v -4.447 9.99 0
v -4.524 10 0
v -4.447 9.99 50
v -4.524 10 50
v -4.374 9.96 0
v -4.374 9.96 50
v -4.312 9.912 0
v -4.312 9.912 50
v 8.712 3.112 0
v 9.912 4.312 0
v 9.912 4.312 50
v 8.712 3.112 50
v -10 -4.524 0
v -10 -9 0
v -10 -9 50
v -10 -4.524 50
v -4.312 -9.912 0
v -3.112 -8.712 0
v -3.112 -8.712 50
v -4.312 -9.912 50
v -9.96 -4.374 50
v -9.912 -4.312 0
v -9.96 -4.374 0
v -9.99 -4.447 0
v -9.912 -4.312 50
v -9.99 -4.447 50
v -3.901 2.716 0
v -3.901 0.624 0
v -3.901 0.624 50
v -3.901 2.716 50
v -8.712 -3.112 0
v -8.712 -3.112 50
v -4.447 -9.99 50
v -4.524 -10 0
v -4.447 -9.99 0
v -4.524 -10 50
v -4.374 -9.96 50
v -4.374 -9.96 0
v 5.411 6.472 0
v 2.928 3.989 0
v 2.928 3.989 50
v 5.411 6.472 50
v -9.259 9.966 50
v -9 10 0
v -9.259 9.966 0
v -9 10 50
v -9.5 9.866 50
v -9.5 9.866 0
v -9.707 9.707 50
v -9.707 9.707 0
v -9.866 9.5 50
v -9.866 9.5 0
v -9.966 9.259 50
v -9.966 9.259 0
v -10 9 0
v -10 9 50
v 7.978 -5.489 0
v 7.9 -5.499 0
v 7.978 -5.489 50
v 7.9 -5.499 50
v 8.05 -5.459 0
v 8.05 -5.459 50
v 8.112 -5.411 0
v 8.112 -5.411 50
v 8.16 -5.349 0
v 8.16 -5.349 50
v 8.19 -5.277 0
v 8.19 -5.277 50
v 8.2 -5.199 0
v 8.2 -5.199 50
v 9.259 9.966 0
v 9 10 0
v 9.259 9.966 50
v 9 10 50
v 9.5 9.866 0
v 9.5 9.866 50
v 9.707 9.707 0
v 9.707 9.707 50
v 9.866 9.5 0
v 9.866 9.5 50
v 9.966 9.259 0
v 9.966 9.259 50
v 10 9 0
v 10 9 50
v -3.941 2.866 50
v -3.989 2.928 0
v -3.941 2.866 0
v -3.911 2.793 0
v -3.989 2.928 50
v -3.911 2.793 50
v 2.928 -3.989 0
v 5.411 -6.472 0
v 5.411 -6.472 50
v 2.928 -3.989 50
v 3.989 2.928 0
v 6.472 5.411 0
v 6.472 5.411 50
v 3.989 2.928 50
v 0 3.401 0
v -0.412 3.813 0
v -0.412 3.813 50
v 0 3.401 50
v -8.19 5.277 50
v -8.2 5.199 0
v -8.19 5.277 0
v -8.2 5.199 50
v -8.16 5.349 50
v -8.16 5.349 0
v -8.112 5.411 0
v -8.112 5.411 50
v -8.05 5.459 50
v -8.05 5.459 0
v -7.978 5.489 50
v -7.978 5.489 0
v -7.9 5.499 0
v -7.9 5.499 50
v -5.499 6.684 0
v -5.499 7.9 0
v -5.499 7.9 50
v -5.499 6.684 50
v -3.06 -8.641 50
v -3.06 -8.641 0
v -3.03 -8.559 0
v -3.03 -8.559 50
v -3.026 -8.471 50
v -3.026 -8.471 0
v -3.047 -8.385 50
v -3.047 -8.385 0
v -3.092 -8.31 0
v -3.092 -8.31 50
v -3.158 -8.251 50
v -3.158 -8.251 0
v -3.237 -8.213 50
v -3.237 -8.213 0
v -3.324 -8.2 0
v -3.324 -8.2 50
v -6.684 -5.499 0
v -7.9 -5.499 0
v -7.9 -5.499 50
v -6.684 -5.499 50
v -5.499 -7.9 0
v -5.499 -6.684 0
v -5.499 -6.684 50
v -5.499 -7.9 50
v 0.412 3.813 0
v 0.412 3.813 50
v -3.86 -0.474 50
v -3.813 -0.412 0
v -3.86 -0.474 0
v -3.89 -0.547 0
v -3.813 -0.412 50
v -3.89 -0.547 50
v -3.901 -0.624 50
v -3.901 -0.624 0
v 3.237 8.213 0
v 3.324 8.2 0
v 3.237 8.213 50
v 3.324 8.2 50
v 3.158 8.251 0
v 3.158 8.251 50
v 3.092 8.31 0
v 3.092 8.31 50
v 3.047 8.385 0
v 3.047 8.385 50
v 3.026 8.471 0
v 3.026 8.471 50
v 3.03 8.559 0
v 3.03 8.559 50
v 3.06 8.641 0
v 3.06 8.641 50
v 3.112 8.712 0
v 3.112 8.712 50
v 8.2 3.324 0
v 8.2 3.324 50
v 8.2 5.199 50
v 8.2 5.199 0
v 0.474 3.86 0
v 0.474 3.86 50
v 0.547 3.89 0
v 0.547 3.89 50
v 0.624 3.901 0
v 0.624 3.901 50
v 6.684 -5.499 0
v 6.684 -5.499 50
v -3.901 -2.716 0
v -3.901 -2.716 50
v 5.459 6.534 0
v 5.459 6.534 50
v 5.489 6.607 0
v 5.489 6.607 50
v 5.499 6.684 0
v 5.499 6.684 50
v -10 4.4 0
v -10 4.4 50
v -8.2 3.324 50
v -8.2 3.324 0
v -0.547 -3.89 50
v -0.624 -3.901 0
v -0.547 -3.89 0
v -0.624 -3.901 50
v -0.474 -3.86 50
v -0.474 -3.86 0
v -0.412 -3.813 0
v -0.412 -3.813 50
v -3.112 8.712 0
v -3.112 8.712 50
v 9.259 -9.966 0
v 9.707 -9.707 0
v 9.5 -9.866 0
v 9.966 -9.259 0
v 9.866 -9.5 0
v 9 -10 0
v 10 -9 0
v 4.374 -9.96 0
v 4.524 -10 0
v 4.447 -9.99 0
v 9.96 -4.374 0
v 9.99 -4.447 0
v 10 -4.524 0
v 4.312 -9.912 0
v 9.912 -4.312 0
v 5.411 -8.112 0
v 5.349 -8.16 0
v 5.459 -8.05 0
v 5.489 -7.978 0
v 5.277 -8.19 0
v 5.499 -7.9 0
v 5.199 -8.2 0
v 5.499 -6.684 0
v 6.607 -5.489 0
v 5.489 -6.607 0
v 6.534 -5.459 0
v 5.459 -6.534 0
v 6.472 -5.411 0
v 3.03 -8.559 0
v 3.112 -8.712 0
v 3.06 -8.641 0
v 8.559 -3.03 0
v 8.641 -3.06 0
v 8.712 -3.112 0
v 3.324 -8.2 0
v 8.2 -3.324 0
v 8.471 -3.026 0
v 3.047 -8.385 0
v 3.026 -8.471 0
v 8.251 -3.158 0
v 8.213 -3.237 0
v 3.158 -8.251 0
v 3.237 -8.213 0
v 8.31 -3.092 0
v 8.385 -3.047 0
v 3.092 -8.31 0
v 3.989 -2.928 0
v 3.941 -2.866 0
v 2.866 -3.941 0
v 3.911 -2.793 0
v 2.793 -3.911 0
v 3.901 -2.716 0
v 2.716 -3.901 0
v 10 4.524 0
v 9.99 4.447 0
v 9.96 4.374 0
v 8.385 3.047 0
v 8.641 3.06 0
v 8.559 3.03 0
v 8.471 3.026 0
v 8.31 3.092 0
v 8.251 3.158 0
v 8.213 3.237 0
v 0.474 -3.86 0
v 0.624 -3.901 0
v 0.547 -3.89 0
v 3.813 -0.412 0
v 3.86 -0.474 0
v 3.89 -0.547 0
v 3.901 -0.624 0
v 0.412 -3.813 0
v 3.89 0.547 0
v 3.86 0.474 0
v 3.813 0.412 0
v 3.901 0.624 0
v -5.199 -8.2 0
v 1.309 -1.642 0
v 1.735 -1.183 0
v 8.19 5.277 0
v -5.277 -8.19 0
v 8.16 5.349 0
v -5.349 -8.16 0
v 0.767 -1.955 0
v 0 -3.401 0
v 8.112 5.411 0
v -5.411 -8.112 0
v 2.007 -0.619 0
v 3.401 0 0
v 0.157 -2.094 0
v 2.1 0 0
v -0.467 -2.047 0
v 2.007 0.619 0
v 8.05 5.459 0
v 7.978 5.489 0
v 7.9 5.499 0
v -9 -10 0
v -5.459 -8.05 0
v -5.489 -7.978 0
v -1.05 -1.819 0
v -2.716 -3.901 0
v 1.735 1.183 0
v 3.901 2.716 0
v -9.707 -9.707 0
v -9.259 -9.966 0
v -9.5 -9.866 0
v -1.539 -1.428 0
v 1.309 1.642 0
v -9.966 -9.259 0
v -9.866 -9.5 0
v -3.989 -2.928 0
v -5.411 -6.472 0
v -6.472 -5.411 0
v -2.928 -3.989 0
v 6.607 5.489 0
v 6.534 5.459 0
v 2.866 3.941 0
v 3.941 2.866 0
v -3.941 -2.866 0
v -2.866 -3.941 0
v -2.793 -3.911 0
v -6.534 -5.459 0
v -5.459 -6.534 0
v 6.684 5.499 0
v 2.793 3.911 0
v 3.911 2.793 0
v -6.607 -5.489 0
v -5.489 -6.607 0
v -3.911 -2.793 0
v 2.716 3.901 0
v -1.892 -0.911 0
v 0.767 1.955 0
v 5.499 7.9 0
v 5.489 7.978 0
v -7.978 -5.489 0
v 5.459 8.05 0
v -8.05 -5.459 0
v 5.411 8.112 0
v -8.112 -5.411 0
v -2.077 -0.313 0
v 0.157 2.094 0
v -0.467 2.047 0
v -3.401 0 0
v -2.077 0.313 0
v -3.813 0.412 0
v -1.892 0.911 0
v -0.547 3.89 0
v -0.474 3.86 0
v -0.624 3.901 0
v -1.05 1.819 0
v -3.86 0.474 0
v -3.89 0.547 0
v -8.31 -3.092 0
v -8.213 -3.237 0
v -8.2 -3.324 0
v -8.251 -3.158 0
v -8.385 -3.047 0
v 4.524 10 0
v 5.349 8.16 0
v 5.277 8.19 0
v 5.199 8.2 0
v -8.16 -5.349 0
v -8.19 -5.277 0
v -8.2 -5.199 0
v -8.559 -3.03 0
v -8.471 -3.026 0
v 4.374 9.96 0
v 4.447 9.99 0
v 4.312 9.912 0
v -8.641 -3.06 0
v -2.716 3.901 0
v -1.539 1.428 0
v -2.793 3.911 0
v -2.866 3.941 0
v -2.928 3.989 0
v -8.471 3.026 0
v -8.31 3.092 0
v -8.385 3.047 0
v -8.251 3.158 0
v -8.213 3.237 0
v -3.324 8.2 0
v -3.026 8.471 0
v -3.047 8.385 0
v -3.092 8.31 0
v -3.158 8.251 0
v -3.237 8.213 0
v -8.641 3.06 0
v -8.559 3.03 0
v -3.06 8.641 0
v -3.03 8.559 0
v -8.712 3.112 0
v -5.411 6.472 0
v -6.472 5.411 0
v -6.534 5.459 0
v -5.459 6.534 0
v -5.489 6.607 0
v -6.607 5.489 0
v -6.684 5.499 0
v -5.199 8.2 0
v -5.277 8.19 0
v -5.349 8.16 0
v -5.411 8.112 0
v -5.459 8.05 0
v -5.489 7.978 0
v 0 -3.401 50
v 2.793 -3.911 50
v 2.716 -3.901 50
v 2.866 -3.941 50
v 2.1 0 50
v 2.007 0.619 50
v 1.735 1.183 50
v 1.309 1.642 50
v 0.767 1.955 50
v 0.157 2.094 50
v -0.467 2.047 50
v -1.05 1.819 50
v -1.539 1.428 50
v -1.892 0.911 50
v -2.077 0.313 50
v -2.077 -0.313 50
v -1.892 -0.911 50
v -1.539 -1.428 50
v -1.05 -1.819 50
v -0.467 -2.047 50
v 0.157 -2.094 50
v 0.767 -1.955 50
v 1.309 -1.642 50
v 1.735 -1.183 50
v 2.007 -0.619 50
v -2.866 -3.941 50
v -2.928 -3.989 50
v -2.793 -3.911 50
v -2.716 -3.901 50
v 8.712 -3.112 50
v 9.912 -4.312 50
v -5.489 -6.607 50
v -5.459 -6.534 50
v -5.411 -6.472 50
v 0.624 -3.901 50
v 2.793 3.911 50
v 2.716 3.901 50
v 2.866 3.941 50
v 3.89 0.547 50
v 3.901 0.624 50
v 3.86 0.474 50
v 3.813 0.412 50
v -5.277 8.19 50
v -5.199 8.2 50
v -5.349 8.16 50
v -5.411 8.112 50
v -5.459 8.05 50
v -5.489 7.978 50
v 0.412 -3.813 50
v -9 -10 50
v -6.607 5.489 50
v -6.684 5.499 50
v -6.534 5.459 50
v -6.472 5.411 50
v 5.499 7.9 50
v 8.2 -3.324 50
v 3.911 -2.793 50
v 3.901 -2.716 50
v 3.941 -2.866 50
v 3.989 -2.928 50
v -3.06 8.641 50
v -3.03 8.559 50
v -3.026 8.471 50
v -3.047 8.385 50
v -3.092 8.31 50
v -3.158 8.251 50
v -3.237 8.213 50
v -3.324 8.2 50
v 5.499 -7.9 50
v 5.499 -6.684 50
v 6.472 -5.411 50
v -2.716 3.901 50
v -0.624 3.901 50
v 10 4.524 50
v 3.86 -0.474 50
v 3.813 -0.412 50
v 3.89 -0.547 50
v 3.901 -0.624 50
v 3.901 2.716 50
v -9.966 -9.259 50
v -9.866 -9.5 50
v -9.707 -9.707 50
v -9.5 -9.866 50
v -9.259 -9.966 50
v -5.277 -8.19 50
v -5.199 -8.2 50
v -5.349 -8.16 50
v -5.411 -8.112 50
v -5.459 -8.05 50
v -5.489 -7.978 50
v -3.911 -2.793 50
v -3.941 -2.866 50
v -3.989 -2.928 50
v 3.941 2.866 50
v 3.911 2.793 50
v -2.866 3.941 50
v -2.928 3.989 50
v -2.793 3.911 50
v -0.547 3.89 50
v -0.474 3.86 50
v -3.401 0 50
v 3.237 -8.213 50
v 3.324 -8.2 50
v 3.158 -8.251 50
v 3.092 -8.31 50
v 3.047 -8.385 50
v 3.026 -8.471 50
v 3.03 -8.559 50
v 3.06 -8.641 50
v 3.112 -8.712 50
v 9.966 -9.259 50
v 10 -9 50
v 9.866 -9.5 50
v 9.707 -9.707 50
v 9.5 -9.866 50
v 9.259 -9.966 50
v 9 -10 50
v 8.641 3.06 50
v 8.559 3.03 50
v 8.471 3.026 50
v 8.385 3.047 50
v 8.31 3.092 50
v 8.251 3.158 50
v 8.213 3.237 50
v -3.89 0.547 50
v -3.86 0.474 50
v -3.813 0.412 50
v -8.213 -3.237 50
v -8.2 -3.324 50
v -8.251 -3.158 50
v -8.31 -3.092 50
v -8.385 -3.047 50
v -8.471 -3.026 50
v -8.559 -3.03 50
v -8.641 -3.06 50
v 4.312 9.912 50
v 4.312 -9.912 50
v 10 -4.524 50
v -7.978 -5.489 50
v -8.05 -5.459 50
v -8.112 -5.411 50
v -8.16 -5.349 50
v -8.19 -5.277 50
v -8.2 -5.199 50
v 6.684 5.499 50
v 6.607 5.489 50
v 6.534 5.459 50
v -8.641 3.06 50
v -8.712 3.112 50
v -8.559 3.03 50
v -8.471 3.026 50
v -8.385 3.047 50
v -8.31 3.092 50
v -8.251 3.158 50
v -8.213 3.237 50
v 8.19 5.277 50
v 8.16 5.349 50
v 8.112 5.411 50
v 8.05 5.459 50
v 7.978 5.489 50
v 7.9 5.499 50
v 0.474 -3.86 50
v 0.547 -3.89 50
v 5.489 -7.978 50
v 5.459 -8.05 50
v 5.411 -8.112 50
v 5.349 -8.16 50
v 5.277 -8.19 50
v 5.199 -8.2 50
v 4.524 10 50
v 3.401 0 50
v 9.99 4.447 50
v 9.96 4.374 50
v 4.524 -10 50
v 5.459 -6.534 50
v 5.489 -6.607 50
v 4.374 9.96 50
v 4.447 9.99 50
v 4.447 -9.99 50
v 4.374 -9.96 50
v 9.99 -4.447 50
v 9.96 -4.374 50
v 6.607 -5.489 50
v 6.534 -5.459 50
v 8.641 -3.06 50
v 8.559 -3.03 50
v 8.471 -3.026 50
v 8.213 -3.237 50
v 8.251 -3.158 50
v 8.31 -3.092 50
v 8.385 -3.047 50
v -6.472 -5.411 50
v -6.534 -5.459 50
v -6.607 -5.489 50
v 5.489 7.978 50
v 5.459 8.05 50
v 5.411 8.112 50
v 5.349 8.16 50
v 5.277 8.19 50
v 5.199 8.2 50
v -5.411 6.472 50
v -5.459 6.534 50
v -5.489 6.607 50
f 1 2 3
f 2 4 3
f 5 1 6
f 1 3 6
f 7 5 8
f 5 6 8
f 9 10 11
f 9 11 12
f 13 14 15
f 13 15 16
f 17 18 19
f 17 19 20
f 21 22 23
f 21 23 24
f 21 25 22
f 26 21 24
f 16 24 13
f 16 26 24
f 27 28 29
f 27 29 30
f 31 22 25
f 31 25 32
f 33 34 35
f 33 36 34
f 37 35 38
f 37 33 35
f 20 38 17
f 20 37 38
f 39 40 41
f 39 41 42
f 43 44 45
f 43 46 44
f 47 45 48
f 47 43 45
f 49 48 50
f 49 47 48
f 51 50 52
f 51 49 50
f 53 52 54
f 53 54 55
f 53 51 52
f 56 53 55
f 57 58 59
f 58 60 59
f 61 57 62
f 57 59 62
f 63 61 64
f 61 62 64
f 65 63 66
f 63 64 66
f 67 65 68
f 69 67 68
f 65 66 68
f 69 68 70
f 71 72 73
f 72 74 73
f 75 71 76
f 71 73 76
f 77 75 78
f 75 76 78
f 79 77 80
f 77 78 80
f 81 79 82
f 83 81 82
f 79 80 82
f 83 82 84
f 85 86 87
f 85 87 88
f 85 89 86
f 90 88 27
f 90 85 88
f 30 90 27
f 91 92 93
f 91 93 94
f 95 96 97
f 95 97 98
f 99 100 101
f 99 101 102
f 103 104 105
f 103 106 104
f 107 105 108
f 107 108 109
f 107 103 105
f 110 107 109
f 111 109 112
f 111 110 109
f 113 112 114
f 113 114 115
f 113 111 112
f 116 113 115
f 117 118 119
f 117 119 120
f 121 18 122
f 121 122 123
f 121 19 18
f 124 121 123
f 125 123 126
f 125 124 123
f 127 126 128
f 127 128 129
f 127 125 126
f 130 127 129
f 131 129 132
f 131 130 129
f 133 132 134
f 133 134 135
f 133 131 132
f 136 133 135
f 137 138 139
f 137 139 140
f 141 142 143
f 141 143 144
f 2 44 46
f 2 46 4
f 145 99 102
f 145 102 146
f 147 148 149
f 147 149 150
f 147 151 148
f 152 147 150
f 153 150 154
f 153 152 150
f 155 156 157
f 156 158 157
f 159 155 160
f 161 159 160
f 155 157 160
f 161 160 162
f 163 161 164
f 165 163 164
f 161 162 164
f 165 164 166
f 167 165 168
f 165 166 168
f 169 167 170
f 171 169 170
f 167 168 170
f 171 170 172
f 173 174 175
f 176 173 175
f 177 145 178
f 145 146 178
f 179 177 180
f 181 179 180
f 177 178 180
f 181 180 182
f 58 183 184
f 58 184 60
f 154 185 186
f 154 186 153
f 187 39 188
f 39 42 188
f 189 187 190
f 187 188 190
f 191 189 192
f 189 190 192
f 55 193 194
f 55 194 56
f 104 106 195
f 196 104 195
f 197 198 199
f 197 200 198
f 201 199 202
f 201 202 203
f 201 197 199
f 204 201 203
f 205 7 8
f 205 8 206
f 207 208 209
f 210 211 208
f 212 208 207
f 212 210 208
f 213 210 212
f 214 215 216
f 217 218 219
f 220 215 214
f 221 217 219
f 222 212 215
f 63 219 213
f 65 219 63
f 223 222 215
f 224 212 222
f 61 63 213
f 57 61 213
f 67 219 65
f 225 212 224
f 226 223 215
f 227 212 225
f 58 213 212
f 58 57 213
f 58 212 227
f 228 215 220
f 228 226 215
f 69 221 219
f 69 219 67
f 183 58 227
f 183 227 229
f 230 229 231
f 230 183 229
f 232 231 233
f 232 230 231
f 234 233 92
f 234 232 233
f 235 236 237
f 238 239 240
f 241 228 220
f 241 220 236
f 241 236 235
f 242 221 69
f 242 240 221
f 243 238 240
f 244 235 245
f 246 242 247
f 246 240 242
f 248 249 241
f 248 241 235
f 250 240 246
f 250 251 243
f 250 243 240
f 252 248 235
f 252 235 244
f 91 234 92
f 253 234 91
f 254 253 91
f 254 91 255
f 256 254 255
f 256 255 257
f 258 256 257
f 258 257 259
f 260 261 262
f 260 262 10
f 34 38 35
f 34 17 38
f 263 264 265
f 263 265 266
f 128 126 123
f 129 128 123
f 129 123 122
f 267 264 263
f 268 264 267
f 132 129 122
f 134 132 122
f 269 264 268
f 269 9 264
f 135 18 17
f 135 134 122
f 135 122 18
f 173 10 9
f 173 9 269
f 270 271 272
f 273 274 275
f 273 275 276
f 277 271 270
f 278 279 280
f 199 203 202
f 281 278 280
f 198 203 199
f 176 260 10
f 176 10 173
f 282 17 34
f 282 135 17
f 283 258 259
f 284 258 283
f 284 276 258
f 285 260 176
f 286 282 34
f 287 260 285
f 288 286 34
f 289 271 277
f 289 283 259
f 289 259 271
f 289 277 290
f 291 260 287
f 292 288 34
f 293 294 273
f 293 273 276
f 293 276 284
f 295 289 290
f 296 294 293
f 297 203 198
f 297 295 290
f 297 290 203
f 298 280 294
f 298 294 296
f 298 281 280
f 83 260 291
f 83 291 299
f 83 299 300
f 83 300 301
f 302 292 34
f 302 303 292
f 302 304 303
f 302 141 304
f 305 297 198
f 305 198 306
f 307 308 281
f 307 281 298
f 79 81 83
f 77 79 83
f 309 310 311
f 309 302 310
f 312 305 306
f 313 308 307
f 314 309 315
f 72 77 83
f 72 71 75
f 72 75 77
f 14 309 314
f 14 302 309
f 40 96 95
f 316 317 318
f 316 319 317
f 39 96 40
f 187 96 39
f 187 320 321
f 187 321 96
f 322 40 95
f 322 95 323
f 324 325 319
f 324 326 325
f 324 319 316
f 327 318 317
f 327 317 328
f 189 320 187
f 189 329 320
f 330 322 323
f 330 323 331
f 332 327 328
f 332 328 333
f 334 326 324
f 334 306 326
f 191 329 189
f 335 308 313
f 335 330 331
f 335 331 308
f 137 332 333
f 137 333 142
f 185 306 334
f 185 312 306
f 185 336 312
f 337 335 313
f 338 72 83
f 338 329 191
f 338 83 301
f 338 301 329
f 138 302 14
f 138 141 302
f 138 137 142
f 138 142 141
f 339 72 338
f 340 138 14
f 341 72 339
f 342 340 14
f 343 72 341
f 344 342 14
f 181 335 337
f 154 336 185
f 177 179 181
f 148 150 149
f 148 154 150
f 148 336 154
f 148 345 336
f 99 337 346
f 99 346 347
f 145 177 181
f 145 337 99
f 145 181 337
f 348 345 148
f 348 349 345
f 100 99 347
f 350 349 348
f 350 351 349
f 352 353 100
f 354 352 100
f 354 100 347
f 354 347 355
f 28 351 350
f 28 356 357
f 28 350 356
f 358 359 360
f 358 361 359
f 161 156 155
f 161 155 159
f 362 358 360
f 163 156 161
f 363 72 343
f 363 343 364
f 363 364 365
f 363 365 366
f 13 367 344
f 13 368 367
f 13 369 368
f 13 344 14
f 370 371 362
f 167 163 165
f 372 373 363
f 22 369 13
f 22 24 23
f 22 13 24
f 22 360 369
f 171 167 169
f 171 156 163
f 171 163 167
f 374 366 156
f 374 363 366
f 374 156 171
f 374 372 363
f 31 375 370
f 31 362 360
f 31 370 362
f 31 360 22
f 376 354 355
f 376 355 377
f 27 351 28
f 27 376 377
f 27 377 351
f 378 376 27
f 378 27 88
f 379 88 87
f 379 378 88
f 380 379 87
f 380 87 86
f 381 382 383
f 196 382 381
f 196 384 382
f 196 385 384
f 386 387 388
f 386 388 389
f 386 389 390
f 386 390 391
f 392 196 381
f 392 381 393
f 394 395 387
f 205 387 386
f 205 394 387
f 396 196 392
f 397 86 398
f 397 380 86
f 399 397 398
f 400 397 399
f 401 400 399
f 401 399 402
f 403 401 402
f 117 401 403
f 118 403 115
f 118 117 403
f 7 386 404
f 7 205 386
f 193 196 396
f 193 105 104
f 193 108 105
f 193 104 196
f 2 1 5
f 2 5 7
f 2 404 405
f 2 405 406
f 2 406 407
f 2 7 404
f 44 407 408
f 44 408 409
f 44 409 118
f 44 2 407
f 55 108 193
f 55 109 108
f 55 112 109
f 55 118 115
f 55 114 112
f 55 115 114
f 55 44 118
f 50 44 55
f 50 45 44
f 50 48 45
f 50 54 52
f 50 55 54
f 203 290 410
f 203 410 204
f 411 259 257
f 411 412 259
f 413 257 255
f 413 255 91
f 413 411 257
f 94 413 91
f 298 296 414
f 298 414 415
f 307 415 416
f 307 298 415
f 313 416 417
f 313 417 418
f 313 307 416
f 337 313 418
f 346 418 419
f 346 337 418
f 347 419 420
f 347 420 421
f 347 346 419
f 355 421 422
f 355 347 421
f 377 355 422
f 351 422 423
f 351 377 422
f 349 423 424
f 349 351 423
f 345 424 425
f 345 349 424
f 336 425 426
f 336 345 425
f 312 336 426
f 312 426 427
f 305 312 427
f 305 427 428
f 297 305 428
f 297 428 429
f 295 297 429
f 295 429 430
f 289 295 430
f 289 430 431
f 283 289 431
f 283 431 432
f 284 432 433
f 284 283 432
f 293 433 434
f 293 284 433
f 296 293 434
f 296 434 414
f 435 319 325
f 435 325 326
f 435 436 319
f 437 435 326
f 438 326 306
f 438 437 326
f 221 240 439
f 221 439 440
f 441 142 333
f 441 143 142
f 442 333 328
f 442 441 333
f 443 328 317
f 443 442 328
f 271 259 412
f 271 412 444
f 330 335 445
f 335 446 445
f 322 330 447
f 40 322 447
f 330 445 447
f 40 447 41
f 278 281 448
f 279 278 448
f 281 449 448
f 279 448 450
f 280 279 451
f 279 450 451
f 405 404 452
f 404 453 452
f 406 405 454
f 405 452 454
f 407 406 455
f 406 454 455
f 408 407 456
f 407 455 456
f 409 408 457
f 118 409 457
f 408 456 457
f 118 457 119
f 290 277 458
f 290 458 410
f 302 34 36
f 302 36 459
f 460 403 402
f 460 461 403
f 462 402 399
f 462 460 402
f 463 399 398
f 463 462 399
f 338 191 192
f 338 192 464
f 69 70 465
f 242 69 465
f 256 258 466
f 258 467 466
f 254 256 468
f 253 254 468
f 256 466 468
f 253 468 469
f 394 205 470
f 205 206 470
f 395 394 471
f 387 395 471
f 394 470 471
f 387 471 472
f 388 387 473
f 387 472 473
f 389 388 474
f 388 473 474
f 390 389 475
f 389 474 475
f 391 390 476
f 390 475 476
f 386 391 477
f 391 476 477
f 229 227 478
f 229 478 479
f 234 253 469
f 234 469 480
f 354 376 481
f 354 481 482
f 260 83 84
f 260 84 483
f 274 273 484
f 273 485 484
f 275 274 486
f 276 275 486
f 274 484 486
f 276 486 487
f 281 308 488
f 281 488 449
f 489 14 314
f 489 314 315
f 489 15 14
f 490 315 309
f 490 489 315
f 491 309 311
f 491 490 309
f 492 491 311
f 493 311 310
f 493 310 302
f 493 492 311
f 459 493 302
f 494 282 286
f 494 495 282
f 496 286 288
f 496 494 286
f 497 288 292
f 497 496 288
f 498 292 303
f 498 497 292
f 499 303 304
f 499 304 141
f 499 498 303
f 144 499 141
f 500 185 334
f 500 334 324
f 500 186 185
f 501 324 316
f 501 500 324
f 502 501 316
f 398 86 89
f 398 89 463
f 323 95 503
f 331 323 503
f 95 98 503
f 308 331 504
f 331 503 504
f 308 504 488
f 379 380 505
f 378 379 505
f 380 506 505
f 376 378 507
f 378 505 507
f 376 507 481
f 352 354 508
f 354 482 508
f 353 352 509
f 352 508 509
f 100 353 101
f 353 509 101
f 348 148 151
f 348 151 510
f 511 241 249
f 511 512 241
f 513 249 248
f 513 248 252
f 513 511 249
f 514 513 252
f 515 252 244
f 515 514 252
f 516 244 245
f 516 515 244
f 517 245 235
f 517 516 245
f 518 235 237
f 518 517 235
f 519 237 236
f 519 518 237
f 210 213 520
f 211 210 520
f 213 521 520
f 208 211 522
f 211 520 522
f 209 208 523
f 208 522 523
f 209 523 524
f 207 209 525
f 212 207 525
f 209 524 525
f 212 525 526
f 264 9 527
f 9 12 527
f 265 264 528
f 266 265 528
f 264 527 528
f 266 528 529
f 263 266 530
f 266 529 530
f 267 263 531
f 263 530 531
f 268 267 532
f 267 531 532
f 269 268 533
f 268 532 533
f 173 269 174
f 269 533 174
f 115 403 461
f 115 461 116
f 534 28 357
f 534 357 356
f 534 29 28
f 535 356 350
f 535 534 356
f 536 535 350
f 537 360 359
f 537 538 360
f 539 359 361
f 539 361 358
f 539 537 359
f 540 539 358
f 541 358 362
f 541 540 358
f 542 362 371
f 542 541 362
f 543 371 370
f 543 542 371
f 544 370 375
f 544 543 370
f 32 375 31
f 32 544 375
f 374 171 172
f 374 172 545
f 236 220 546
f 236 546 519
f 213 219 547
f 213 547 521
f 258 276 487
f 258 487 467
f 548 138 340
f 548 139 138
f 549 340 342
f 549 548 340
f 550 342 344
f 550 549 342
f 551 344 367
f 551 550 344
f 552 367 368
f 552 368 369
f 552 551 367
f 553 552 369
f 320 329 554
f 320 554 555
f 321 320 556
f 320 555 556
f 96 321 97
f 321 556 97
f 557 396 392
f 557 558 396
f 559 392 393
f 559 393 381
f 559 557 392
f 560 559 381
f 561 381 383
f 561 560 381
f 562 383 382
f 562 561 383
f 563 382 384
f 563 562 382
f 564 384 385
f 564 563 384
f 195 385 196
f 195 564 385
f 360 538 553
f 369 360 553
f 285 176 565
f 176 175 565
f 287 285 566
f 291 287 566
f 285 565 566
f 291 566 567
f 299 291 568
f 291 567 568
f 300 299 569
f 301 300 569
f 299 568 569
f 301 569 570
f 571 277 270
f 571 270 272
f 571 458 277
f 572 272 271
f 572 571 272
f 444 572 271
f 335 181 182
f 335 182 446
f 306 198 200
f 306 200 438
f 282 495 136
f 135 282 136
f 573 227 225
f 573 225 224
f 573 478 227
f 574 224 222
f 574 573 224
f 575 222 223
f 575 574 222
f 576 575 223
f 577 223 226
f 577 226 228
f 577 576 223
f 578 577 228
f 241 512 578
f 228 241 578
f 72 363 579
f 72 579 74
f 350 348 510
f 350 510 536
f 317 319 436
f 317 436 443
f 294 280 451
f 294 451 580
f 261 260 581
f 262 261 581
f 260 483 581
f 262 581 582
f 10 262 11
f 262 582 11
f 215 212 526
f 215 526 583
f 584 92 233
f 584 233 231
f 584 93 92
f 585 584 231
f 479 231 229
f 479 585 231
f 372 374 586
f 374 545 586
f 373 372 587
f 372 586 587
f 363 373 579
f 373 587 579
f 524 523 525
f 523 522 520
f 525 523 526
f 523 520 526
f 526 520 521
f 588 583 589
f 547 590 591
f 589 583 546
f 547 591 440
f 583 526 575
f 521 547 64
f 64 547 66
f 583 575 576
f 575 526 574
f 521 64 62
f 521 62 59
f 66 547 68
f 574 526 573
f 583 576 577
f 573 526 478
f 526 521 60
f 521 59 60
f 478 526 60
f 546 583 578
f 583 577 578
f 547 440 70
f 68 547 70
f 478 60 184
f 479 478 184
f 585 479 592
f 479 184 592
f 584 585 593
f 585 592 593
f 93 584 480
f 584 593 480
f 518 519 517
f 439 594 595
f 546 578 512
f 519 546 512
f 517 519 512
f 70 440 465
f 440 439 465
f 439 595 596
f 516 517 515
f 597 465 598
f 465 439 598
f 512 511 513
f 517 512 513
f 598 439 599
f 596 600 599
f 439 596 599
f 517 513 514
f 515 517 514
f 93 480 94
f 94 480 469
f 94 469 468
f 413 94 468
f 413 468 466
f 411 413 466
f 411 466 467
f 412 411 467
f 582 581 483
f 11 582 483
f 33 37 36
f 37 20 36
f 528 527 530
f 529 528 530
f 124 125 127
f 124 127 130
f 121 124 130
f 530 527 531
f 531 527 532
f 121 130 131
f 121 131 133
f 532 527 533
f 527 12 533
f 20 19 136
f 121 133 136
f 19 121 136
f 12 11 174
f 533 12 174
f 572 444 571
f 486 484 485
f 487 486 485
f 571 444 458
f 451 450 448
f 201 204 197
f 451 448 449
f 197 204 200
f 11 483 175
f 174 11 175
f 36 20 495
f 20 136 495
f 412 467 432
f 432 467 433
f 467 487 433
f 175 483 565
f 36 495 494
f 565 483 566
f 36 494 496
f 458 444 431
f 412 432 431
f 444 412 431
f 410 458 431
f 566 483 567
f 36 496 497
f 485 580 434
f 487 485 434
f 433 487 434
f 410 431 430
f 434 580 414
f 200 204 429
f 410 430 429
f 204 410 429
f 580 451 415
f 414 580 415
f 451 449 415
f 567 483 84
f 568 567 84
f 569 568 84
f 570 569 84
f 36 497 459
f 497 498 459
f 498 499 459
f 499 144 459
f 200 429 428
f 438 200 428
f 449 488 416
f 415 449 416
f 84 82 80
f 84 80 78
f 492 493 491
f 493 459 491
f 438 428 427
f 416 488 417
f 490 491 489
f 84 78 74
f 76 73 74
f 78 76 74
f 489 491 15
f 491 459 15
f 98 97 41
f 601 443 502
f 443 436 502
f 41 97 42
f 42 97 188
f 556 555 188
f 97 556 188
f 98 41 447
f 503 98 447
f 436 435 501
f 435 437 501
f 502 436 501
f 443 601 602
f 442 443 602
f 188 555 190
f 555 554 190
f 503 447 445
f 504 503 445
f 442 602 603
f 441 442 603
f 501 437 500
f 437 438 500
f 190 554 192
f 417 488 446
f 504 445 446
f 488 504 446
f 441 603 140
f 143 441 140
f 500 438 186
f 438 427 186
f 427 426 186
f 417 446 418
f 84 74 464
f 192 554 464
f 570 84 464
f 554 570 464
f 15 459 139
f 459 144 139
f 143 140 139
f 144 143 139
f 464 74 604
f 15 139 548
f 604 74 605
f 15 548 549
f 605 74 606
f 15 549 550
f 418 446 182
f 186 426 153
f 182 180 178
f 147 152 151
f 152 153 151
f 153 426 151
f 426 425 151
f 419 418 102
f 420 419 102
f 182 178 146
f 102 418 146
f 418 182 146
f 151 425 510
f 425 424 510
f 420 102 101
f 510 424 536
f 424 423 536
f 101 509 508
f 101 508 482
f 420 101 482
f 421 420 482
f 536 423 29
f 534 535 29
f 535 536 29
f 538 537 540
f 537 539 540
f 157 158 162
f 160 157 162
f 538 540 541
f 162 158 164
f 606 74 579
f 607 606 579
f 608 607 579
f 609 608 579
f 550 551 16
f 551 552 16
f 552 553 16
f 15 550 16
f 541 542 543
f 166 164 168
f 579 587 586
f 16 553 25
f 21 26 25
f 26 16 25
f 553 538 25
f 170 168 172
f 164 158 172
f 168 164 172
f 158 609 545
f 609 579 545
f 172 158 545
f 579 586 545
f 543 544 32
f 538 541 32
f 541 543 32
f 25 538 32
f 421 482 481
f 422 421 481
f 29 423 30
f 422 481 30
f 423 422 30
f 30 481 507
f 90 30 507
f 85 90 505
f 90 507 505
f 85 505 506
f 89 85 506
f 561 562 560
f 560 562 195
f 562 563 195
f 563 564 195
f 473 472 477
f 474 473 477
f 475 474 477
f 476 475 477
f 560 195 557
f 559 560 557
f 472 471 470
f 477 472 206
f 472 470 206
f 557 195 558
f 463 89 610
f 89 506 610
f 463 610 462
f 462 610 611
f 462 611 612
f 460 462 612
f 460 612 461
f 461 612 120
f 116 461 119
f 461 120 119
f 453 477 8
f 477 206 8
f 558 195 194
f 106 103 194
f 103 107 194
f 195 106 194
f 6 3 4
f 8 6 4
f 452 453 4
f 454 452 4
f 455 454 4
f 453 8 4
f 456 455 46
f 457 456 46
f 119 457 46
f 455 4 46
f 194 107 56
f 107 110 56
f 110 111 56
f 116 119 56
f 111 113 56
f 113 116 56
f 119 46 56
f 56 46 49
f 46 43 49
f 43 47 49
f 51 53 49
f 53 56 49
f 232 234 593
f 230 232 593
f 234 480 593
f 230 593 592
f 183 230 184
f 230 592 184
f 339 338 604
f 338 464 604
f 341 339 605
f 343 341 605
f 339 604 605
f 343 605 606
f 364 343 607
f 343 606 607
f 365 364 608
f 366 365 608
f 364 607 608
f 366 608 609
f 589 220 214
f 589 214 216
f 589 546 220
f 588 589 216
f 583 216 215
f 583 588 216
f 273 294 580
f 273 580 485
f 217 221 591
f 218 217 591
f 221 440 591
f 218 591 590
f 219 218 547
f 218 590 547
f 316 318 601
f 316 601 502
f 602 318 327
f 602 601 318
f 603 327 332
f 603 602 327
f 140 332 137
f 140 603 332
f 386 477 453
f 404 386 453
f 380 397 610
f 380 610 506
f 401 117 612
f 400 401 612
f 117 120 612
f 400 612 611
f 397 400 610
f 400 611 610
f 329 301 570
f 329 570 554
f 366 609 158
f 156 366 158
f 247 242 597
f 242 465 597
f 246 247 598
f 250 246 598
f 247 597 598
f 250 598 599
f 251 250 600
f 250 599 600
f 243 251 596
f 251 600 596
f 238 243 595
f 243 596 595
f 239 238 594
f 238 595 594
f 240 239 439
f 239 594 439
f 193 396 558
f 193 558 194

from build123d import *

# Parameters (mm, degrees)
SKETCH_1_R      = 2.1
EXTRUDE_1_DEPTH = 50
FILLET_1_R      = 1
FILLET_2_R      = 0.3


with BuildPart() as part:
    # Эскиз1 → Бобышка-Вытянуть1 (new body)
    with BuildSketch(Plane.XY):
        Polygon((-10, 10), (-4.4, 10), (-2.6, 8.2), (-5.499339828, 8.2), (-5.499339828, 6.56), (-2.84, 3.900660172), (-0.5, 3.900660172), (0, 3.400660172), (0.5, 3.900660172), (2.84, 3.900660172), (5.499339828, 6.56), (5.499339828, 8.2), (2.6, 8.2), (4.4, 10), (10, 10), (10, 4.4), (8.2, 2.6), (8.2, 5.499339828), (6.56, 5.499339828), (3.900660172, 2.84), (3.900660172, 0.5), (3.400660172, 0), (3.900660172, -0.5), (3.900660172, -2.84), (6.56, -5.499339828), (8.2, -5.499339828), (8.2, -2.6), (10, -4.4), (10, -10), (4.4, -10), (2.6, -8.2), (5.499339828, -8.2), (5.499339828, -6.56), (2.84, -3.900660172), (0.5, -3.900660172), (0, -3.400660172), (-0.5, -3.900660172), (-2.84, -3.900660172), (-5.499339828, -6.56), (-5.499339828, -8.2), (-2.6, -8.2), (-4.4, -10), (-10, -10), (-10, -4.4), (-8.2, -2.6), (-8.2, -5.499339828), (-6.56, -5.499339828), (-3.900660172, -2.84), (-3.900660172, -0.5), (-3.400660172, 0), (-3.900660172, 0.5), (-3.900660172, 2.84), (-6.56, 5.499339828), (-8.2, 5.499339828), (-8.2, 2.6), (-10, 4.4), align=None)
        Circle(SKETCH_1_R, mode=Mode.SUBTRACT)
    extrude(amount=EXTRUDE_1_DEPTH)

    # Скругление1
    fillet_1_edges = [part.edges().sort_by_distance(p)[0] for p in [
        (-10, 10, 25),
        (10, 10, 25),
        (10, -10, 25),
        (-10, -10, 25),
    ]]
    fillet(fillet_1_edges, radius=FILLET_1_R)

    # Скругление2
    fillet_2_edges = [part.edges().sort_by_distance(p)[0] for p in [
        (-4.4, 10, 25),
        (-2.6, 8.2, 25),
        (-5.499339828, 8.2, 25),
        (-5.499339828, 6.56, 25),
        (-2.84, 3.900660172, 25),
        (-0.5, 3.900660172, 25),
        (0.5, 3.900660172, 25),
        (2.84, 3.900660172, 25),
        (5.499339828, 6.56, 25),
        (5.499339828, 8.2, 25),
        (2.6, 8.2, 25),
        (4.4, 10, 25),
        (10, 4.4, 25),
        (8.2, 2.6, 25),
        (8.2, 5.499339828, 25),
        (6.56, 5.499339828, 25),
        (3.900660172, 2.84, 25),
        (3.900660172, 0.5, 25),
        (3.900660172, -0.5, 25),
        (3.900660172, -2.84, 25),
        (6.56, -5.499339828, 25),
        (8.2, -5.499339828, 25),
        (8.2, -2.6, 25),
        (10, -4.4, 25),
        (4.4, -10, 25),
        (2.6, -8.2, 25),
        (5.499339828, -8.2, 25),
        (5.499339828, -6.56, 25),
        (2.84, -3.900660172, 25),
        (0.5, -3.900660172, 25),
        (-0.5, -3.900660172, 25),
        (-2.84, -3.900660172, 25),
        (-5.499339828, -6.56, 25),
        (-5.499339828, -8.2, 25),
        (-2.6, -8.2, 25),
        (-4.4, -10, 25),
        (-10, -4.4, 25),
        (-8.2, -2.6, 25),
        (-8.2, -5.499339828, 25),
        (-6.56, -5.499339828, 25),
        (-3.900660172, -2.84, 25),
        (-3.900660172, -0.5, 25),
        (-3.900660172, 0.5, 25),
        (-3.900660172, 2.84, 25),
        (-6.56, 5.499339828, 25),
        (-8.2, 5.499339828, 25),
        (-8.2, 2.6, 25),
    ]]
    fillet(fillet_2_edges, radius=FILLET_2_R)


solid = part.part
